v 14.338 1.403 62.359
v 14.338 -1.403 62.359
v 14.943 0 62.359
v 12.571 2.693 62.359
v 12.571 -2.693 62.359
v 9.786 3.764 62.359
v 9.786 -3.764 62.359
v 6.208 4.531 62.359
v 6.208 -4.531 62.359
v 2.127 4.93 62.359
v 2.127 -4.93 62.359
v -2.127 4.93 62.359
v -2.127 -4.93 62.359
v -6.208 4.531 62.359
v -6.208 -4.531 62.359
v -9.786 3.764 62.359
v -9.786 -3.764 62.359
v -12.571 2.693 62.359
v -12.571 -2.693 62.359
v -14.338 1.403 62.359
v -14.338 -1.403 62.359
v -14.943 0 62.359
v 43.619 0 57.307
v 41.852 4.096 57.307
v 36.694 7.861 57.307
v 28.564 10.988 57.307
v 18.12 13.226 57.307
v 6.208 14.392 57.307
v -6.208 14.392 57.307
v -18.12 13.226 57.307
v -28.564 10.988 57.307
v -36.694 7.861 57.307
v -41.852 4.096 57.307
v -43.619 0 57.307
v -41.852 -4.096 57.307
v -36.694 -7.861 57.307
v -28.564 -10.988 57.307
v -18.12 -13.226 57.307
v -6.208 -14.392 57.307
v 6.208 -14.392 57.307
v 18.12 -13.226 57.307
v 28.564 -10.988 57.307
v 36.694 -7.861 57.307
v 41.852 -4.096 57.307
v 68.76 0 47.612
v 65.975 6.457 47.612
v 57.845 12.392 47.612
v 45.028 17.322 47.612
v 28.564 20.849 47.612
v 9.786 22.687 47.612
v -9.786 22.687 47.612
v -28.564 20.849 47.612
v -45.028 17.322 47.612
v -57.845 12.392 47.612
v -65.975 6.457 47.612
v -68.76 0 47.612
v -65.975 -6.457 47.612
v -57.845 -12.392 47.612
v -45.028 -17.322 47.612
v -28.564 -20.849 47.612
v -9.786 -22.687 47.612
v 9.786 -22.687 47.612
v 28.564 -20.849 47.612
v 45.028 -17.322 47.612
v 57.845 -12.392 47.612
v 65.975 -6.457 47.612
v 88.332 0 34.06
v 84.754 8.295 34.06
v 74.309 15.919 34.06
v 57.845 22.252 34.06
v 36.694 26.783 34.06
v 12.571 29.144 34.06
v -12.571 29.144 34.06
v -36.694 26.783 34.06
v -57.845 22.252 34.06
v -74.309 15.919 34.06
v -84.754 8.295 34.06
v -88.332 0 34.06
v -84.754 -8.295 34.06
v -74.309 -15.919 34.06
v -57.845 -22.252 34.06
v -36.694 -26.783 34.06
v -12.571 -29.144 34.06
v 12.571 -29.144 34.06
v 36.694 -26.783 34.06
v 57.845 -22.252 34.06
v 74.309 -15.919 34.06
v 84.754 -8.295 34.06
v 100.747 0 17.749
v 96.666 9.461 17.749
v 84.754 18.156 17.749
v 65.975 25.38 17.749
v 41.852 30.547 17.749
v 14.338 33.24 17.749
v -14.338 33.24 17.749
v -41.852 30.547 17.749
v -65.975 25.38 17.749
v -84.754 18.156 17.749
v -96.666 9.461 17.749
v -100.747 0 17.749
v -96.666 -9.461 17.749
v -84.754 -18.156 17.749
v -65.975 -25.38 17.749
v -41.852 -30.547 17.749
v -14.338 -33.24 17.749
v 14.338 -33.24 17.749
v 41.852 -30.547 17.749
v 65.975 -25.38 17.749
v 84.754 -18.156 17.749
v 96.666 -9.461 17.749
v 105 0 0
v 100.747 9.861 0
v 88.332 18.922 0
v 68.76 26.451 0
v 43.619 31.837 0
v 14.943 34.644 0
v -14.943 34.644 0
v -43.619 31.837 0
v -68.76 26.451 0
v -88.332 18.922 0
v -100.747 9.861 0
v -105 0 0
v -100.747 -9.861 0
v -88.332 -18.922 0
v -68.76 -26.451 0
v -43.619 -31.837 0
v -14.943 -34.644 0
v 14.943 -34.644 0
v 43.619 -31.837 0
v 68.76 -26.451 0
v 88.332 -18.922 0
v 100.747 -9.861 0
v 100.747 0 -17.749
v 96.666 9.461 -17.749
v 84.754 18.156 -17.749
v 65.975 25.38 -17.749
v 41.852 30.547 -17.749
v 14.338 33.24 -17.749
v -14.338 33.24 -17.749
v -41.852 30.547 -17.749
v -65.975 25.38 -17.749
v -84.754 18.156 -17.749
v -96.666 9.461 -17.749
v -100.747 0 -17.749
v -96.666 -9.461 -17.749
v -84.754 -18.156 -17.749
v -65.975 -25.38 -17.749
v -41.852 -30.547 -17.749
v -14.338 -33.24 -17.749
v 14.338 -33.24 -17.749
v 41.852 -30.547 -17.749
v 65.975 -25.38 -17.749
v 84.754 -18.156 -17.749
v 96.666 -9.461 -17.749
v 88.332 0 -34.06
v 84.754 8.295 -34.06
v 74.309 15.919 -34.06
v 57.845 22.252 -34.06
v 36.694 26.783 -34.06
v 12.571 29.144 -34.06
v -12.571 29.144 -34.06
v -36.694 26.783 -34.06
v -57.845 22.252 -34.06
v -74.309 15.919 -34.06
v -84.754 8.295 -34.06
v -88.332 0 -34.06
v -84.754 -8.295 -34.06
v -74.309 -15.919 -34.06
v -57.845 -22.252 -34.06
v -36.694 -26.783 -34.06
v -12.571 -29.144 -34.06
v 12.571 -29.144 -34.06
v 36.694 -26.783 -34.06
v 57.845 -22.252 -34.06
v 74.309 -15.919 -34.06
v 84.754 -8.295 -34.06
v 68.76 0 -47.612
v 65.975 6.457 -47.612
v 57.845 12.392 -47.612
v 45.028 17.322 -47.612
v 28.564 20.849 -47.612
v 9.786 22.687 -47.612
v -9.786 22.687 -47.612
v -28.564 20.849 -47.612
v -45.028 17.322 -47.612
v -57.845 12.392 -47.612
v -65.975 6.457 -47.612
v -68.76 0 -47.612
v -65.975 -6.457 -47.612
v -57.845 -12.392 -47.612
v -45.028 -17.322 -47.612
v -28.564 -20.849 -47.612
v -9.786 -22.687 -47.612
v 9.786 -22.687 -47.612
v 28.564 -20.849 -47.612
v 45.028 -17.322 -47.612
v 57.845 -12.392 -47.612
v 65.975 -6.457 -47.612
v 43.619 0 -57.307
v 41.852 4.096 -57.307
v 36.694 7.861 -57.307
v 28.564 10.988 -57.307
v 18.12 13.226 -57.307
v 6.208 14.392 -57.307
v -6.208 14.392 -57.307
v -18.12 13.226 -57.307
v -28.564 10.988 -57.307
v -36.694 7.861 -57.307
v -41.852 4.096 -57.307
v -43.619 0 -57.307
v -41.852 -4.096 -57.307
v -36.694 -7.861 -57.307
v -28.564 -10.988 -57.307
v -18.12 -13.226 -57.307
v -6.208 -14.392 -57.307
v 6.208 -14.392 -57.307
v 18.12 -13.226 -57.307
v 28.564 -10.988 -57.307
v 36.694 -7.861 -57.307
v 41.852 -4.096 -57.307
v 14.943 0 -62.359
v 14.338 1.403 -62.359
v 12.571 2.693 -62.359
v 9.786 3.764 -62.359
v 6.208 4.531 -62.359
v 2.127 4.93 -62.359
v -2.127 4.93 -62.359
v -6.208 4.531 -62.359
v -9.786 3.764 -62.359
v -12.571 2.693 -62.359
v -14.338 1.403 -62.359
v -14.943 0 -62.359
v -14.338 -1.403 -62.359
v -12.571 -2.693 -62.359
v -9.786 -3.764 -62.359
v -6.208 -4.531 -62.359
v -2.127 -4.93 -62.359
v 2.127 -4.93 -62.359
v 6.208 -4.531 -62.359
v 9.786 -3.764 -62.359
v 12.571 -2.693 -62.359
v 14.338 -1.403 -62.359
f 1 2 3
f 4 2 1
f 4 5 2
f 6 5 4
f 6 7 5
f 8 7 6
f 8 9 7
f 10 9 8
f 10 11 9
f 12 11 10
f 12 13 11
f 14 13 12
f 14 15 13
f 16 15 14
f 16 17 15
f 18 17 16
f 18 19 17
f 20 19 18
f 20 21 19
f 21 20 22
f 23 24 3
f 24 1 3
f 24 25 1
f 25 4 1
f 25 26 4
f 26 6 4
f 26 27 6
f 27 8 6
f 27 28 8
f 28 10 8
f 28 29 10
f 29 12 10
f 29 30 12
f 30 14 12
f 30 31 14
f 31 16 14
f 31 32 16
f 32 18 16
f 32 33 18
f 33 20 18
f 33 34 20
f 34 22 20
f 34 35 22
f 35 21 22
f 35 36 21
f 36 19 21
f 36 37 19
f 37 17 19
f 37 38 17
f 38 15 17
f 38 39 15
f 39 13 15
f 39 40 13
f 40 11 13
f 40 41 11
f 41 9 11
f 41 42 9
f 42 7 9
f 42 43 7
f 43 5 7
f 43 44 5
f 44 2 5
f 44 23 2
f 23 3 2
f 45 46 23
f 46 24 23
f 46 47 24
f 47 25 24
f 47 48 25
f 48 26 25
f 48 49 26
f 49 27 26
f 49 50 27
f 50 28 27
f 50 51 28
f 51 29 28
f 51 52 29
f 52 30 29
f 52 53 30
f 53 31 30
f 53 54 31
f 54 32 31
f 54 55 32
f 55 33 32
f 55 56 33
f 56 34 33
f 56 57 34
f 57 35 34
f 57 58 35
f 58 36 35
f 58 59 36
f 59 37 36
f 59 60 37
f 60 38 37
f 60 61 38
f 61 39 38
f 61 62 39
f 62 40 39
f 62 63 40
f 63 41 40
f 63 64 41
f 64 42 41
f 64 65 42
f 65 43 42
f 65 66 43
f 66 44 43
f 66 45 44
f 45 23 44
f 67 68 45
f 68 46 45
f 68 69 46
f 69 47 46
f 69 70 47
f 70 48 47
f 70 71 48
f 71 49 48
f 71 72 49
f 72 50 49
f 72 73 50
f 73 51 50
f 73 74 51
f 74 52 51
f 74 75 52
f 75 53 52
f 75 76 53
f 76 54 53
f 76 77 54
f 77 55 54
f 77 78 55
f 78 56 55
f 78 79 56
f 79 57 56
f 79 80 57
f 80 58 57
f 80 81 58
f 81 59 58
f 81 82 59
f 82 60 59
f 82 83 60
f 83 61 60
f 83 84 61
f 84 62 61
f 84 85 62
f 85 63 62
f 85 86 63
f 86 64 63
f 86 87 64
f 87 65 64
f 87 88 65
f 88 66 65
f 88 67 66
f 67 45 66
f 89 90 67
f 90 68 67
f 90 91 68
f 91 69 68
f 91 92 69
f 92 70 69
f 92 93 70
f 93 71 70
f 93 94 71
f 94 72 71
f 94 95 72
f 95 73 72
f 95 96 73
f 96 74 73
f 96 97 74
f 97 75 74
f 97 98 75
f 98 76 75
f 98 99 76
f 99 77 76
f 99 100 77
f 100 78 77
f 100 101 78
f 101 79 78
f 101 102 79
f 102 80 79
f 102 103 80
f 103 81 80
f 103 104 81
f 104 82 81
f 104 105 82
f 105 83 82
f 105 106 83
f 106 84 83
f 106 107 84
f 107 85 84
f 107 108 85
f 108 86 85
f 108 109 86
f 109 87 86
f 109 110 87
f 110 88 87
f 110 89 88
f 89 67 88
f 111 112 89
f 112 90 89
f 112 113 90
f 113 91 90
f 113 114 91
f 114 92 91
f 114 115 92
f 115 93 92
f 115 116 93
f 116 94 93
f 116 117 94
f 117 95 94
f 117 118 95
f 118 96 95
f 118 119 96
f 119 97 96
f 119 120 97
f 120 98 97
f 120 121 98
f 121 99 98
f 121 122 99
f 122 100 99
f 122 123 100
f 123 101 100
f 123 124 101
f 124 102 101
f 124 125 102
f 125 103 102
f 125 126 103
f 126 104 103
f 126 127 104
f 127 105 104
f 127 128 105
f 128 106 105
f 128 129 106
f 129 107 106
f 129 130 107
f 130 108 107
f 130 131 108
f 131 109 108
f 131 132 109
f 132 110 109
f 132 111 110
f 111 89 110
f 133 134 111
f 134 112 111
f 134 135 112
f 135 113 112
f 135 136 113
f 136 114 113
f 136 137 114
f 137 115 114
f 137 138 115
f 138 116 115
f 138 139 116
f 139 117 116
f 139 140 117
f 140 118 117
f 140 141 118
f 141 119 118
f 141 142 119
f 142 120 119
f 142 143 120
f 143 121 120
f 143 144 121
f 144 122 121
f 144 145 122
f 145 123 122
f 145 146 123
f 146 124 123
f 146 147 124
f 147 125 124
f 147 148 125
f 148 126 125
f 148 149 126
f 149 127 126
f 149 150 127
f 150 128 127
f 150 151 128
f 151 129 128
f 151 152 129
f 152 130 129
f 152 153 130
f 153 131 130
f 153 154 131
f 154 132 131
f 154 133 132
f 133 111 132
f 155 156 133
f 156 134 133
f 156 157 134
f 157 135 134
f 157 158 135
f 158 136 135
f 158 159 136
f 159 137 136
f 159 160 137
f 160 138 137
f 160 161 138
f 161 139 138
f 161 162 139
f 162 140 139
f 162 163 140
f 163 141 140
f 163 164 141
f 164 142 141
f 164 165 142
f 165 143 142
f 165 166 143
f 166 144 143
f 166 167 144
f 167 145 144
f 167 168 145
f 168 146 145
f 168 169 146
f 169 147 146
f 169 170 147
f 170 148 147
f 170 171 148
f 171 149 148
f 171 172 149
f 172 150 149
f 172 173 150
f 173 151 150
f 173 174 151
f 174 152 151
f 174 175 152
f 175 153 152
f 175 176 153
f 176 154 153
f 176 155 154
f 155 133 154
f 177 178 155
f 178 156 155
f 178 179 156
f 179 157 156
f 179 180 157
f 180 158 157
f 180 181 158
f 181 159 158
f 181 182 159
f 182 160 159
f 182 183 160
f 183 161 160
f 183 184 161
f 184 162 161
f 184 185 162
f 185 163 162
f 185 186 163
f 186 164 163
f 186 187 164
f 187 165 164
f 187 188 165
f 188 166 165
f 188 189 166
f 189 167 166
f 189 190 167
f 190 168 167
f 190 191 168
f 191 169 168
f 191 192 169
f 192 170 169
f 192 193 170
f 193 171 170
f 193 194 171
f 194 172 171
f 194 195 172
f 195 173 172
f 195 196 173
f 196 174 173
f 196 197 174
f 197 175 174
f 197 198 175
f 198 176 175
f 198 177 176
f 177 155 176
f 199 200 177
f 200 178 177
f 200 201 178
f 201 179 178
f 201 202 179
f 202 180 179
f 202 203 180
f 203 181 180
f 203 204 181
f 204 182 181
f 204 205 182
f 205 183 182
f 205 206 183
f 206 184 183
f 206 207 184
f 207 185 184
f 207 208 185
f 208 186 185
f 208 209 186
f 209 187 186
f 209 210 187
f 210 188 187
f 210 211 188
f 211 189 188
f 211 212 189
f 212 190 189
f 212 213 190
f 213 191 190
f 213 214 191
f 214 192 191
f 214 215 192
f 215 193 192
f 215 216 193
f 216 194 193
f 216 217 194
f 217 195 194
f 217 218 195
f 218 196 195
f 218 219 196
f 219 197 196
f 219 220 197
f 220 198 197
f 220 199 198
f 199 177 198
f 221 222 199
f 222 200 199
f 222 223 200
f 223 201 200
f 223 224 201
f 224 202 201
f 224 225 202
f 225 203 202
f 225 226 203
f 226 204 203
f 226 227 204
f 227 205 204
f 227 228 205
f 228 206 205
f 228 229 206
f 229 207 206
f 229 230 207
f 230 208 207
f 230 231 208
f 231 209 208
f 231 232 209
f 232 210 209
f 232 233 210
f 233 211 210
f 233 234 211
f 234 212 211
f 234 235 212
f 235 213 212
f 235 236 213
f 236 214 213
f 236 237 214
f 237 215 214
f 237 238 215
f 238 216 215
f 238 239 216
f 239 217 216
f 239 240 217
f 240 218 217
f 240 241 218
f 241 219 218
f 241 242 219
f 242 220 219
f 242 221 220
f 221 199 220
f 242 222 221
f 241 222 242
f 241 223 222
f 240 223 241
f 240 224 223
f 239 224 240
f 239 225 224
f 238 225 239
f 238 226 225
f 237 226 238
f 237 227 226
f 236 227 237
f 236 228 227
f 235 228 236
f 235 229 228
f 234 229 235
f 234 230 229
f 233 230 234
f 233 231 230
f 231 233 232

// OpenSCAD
// Generated by SolidPython 1.0.1 on 2020-07-29 00:46:51


scale(v = [15, 5, 9]) {
	sphere(r = 7);
}
/***********************************************
*********      SolidPython code:      **********
************************************************
 
# import packages: SolidPython
from solid import *
from solid.utils import *
from itertools import chain, combinations, permutations


class Resize:

    def __init__(self, scad_file):
        self.scad_file = scad_file
        #self.scad_file = import_scad(scad_file)
        # cone/cylinder param:
        self.r1 = 0
        self.r2 = 0
        self.h = 0
        # rectangular prism param:
        self.w = 0
        self.l = 0
        # ellipse param:
        self.r = 0

    # import OpenScad code (file name corresponds to shape)


    # classify shape + parameters
    def assign(self, param1, param2, param3):
        if self.scad_file == 'cone.scad':
            self.r1 = param1
            self.r2 = param2
            self.h = param3
        elif self.scad_file == 'cylinder.scad':
            self.r1 = param1
            self.r2 = param2
            self.h = param3
        elif self.scad_file == 'rectangularPrism.scad':
            self.h = param1
            self.l = param2
            self.w = param3
        else:
            self.r = param1
            self.h = param2

    # resize parameters
    def iterate(self):
        x = range(3, 20, 2)
        i = 1
        if self.scad_file == 'cone.scad':
            tempList = list(permutations(x, 2))
            for temp in tempList:
                param1 = temp[0]
                param2 = temp[1]
                filepath = 'produced_scad_files/' + 'cone' + str(param1) + '_' + str(param2) + '_' + '.scad'
                scad_render_to_file(cylinder(h=param1, r1=param2, r2=0), filepath)

        elif self.scad_file == 'cylinder.scad':
            tempList = list(permutations(x, 3))
            for temp in tempList:
                param1 = temp[0]
                param2 = temp[1]
                filepath = 'produced_scad_files/' + 'cylinder' + str(param1) + '_' + str(param2) + '_' + '.scad'
                scad_render_to_file(cylinder(h=param1, r1=param2, r2=param2), filepath)

        elif self.scad_file == 'rectangularPrism.scad':
            tempList = list(permutations(x, 3))
            for temp in tempList:
                param1 = temp[0]
                param2 = temp[1]
                param3 = temp[2]
                filepath = 'produced_scad_files/' + 'rectangularPrism' + str(param1) + '_' + str(param2) + '_' + str(
                    param3) + '.scad'
                scad_render_to_file(cube(size=(param1, param2, param3)), filepath)

        elif self.scad_file == 'ellipse.scad':
            tempList = list(permutations(x, 4))
            for temp in tempList:
                param1 = temp[0]
                param2 = temp[1]
                param3 = temp[2]
                param4 = temp[3]
                filepath = 'produced_scad_files/' + 'ellipse' + str(param1) + '_' + str(param2) + '_' + str(param3) + '_' + str(param4) + '.scad'
                scad_render_to_file(scale([param1, param2, param3])(sphere(r=param4)), filepath)

    def render_to_scadfile(self):
        scad_render_to_file(scad, 'example.scad') 
 
************************************************/
